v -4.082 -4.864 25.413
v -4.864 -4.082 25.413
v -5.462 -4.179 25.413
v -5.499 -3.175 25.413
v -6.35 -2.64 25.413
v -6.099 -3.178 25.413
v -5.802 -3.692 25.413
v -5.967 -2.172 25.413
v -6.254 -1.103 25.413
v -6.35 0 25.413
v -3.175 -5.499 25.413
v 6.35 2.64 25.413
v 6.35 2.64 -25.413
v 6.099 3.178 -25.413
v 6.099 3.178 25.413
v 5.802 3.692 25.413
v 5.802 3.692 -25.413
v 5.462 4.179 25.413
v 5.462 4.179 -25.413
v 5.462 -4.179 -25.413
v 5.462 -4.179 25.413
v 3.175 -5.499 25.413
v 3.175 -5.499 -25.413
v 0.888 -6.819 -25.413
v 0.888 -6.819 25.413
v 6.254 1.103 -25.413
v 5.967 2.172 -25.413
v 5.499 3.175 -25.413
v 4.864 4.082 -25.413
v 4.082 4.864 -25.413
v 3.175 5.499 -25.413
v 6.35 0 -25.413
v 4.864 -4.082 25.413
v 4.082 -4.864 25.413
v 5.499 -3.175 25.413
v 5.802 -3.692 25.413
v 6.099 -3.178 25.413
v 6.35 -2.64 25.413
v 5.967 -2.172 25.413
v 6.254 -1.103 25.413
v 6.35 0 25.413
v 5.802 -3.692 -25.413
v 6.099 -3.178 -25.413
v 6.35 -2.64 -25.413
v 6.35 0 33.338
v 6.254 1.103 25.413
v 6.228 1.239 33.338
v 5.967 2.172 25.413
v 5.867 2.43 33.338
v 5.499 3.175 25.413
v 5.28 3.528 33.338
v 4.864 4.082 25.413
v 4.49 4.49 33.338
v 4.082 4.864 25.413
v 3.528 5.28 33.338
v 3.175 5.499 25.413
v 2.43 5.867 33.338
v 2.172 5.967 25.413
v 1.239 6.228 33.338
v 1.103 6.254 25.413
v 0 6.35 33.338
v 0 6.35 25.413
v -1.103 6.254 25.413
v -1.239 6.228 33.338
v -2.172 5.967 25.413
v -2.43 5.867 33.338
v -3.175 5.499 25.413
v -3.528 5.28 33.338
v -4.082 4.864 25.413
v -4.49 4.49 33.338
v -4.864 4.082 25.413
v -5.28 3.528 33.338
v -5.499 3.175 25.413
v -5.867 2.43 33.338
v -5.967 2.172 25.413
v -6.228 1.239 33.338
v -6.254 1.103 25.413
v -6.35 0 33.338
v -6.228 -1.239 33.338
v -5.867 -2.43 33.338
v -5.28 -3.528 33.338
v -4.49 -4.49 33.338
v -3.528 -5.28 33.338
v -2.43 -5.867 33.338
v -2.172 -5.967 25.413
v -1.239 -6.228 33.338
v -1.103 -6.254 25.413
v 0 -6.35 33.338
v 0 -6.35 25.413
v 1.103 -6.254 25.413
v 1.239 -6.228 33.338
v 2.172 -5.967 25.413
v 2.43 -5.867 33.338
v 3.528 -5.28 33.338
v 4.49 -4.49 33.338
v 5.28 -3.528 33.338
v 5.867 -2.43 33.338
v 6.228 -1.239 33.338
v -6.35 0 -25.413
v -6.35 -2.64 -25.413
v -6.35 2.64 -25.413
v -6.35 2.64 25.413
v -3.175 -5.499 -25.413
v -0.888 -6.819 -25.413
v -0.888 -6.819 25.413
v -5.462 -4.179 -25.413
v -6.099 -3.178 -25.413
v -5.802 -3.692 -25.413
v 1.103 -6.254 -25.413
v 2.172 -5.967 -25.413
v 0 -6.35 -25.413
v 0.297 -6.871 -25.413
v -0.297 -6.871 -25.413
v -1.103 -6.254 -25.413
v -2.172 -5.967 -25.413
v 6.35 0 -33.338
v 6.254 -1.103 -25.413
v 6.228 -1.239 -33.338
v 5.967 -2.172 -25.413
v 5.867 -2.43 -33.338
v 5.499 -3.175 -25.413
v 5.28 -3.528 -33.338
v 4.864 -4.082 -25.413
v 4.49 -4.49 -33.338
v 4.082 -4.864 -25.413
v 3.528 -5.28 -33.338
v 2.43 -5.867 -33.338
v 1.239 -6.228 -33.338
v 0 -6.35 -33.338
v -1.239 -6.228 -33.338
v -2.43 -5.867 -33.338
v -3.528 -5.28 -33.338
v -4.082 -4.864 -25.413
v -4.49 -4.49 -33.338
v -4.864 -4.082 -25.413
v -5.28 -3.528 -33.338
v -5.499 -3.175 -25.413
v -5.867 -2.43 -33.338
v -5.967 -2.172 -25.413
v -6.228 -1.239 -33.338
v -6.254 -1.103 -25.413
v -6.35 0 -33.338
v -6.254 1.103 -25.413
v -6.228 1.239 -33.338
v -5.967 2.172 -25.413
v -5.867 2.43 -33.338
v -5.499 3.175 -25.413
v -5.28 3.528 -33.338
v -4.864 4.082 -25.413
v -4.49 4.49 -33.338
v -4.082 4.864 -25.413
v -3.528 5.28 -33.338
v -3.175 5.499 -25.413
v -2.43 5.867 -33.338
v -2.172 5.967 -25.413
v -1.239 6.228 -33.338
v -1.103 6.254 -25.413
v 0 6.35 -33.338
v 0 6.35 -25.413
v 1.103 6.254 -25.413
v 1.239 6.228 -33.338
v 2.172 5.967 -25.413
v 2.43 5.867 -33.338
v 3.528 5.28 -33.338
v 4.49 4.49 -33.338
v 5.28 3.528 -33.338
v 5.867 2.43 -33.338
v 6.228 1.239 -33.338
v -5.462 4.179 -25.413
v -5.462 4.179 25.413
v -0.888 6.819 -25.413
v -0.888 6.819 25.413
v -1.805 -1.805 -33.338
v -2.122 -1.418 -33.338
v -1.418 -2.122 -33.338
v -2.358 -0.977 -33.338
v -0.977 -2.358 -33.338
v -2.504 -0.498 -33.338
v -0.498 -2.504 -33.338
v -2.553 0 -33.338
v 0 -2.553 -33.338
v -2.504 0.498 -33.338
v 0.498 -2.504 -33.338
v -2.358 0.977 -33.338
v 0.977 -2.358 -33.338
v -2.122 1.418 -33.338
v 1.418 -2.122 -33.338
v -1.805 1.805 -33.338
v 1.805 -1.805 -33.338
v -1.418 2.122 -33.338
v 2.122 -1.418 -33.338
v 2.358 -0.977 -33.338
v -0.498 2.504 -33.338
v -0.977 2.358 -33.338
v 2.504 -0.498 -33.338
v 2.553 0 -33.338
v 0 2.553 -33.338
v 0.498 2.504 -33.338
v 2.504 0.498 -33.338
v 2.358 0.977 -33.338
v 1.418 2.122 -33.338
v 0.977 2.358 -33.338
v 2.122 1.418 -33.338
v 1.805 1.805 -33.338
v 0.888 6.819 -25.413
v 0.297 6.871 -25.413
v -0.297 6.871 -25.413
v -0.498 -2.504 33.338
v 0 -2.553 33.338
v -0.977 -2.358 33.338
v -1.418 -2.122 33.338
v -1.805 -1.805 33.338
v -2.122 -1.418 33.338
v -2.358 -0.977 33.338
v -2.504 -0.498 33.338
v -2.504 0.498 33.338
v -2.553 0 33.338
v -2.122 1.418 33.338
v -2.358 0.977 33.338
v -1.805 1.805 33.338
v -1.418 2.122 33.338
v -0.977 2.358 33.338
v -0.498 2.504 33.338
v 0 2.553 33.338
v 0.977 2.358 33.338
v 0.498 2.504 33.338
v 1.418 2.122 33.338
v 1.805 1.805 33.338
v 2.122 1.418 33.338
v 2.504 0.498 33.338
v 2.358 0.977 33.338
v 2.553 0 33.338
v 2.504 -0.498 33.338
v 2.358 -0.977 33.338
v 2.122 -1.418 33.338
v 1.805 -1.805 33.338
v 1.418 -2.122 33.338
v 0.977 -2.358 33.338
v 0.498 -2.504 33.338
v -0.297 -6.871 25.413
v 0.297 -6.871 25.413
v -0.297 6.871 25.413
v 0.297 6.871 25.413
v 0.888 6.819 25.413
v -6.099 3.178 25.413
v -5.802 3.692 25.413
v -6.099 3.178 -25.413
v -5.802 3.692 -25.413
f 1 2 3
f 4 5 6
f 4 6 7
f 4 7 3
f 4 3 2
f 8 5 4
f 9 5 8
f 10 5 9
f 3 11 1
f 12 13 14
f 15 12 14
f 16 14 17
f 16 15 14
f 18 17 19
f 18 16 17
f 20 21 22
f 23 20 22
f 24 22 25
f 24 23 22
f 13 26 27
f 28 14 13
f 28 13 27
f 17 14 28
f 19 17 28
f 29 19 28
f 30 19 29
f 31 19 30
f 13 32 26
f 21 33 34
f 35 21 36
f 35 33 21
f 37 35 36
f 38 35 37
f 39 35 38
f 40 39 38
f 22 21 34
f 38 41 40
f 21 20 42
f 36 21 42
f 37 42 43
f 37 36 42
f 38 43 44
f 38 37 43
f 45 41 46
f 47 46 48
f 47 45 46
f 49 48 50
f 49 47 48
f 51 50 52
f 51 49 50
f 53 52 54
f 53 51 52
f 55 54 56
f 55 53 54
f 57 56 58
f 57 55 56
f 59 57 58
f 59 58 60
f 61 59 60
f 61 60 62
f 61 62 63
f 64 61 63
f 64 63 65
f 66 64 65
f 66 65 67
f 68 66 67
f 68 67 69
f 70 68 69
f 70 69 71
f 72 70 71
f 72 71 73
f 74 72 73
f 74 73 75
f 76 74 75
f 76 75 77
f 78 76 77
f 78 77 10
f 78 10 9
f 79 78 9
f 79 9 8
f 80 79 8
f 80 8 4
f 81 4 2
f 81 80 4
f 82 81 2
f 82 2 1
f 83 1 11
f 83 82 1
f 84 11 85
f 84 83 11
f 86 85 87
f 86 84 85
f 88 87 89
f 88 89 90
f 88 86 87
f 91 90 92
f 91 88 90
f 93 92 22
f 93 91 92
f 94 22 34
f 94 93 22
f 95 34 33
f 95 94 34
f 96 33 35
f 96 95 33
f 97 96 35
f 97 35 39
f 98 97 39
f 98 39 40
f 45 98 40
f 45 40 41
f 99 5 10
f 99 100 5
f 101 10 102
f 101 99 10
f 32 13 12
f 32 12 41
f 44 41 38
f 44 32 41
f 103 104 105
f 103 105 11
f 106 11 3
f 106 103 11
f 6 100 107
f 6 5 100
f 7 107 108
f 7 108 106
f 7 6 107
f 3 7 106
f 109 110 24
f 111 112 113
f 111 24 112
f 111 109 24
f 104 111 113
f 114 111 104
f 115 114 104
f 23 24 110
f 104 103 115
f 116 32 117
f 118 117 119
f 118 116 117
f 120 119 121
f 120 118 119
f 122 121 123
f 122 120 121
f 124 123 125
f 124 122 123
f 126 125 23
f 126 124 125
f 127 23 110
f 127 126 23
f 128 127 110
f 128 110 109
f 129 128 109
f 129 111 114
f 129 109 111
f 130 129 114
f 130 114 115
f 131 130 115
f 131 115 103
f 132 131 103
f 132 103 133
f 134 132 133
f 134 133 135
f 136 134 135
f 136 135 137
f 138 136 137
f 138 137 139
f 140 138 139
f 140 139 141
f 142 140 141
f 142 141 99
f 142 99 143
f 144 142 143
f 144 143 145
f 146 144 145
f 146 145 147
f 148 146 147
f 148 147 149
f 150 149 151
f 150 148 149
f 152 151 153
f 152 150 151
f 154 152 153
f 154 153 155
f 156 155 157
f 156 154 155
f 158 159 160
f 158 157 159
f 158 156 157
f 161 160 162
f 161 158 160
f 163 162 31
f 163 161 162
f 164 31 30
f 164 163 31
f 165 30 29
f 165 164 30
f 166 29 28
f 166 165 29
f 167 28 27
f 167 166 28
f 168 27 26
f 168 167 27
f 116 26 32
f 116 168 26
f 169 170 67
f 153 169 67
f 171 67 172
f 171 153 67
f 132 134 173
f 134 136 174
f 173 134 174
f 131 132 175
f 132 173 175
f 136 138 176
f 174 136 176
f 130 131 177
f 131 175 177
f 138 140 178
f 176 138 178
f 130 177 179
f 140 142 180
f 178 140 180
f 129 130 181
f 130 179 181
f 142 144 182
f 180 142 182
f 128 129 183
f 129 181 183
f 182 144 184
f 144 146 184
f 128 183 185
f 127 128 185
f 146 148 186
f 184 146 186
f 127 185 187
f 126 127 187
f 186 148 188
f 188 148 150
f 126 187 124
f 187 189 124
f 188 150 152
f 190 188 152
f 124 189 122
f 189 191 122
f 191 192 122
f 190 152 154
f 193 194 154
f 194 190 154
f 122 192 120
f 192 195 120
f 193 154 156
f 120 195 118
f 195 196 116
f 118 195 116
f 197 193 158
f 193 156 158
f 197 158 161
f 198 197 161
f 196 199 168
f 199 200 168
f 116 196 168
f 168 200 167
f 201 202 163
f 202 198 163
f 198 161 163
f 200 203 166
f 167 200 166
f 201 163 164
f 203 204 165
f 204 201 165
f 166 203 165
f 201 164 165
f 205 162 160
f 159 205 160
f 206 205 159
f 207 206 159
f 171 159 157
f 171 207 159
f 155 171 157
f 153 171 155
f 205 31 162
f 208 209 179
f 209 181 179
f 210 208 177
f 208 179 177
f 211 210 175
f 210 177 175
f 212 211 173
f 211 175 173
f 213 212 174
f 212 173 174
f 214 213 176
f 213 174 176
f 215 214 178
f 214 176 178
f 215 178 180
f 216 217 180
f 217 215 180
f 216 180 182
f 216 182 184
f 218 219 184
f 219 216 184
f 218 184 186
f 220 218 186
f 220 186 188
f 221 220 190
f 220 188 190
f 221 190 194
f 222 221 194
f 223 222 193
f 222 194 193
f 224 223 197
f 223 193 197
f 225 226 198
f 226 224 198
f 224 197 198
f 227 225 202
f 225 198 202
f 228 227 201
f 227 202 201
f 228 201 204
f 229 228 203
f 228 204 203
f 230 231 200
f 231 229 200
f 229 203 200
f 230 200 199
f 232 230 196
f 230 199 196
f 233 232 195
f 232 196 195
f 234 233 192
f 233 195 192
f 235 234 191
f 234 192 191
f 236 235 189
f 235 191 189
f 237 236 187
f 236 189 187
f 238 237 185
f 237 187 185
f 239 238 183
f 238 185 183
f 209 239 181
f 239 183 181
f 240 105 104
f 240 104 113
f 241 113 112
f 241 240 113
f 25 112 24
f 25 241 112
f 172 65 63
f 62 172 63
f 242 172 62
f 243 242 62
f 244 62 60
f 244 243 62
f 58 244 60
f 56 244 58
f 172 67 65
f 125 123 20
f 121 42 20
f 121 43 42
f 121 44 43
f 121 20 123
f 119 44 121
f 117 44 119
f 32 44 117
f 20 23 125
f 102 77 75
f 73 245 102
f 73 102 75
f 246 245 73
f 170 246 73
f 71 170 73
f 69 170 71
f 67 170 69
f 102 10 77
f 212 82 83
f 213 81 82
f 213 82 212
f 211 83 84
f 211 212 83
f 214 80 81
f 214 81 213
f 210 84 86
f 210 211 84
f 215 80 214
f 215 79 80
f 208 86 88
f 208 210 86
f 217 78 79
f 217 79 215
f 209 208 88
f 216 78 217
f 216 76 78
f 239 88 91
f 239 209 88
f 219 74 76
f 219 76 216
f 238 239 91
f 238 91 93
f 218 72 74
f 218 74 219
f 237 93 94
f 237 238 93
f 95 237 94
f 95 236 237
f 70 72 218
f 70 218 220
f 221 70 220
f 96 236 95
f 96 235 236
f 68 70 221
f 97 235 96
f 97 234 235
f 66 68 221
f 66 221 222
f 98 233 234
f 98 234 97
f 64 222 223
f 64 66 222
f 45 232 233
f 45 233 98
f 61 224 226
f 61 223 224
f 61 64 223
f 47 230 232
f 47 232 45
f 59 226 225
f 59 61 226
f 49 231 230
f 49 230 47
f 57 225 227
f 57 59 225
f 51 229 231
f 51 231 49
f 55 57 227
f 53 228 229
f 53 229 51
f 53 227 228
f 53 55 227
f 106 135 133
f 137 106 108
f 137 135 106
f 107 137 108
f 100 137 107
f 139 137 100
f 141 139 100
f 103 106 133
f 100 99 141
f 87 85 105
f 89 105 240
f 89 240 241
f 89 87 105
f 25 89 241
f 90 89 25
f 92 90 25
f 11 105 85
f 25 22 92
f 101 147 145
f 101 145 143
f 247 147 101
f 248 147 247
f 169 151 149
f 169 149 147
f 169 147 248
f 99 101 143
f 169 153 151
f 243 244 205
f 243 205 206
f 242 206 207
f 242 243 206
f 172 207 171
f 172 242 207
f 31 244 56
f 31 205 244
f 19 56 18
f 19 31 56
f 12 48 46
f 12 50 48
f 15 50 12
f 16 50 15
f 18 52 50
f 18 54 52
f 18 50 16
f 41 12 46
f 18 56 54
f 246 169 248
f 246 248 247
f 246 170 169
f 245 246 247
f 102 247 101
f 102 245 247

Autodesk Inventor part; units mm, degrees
ref_plane "YZ Plane" through (0, 0, 0) normal (1, 0, 0) x (0, 1, 0)
ref_plane "XZ Plane" through (0, 0, 0) normal (0, 1, 0) x (-1, 0, 0)
ref_plane "XY Plane" through (0, 0, 0) normal (0, 0, 1) x (1, 0, 0)
sketch "Sketch1" plane through (0, 0, 0) normal (0, 0, 1) x (1, 0, 0)
  line L0 (-6.35, -3.6662) -> (-6.35, 3.6662)
  line L1 (-6.35, 3.6662) -> (0, 7.3323)
  line L2 (0, 7.3323) -> (6.35, 3.6662)
  line L3 (6.35, 3.6662) -> (6.35, -3.6662)
  line L4 (6.35, -3.6662) -> (0, -7.3323)
  line L5 (0, -7.3323) -> (-6.35, -3.6662)
  point P0 (0, 0)
  point P1 (0, 0)
  dimension "Size" = 12.7
extrude "Extrusion1" add sketch "Sketch1" along normal mid plane 66.675
sketch "Sketch3" plane through (0, 0, 33.3375) normal (0, 0, 1) x (1, 0, 0)
  line L0 (-6.35, 3.6662) -> (0, 7.3323) construction
  line L1 (0, 7.3323) -> (6.35, 3.6662) construction
  line L2 (6.35, 3.6662) -> (6.35, -3.6662) construction
  line L3 (6.35, -3.6662) -> (0, -7.3323) construction
  line L4 (0, -7.3323) -> (-6.35, -3.6662) construction
  line L5 (-6.35, -3.6662) -> (-6.35, 3.6662) construction
  point P0 (0, 0)
hole "Hole1" at (0, 0, 33.3375) direction (0, 0, -1) diameter 5.1054 end through all
sketch "Sketch4" plane through (0, 0, 33.3375) normal (0, 0, 1) x (1, 0, 0)
  circle A0 centre (0, 0) radius 2.5527 construction
  line L0 (-6.35, 3.6662) -> (0, 7.3323) construction
  line L1 (0, 7.3323) -> (6.35, 3.6662) construction
  line L2 (6.35, 3.6662) -> (6.35, -3.6662) construction
  line L3 (6.35, -3.6662) -> (0, -7.3323) construction
  line L4 (0, -7.3323) -> (-6.35, -3.6662) construction
  line L5 (-6.35, -3.6662) -> (-6.35, 3.6662) construction
  circle A1 centre (0, 0) radius 6.8771
  circle A2 centre (0, 0) radius 8.89
  dimension "thunder" = 13.7541
  dimension "d16" = 17.78
extrude "Extrusion3" cut sketch "Sketch4" against normal through all
sketch "Sketch5" plane through (0, 0, 33.3375) normal (0, 0, 1) x (1, 0, 0)
  circle A0 centre (0, 0) radius 2.5527 projected
  circle A1 centre (0, 0) radius 6.35
  arc A2 (5.4616, -4.1791) -> (6.35, -2.6403) centre (0, 0) ccw projected
  line L0 (6.35, -2.6403) -> (6.35, 2.6403) projected
  arc A3 (6.35, 2.6403) -> (5.4616, 4.1791) centre (0, 0) ccw projected
  line L1 (5.4616, 4.1791) -> (0.8884, 6.8194) projected
  arc A4 (0.8884, 6.8194) -> (-0.8884, 6.8194) centre (0, 0) ccw projected
  line L2 (-0.8884, 6.8194) -> (-5.4616, 4.1791) projected
  arc A5 (-5.4616, 4.1791) -> (-6.35, 2.6403) centre (0, 0) ccw projected
  line L3 (-6.35, 2.6403) -> (-6.35, -2.6403) projected
  arc A6 (-6.35, -2.6403) -> (-5.4616, -4.1791) centre (0, 0) ccw projected
  line L4 (-5.4616, -4.1791) -> (-0.8884, -6.8194) projected
  arc A7 (-0.8884, -6.8194) -> (0.8884, -6.8194) centre (0, 0) ccw projected
  line L5 (0.8884, -6.8194) -> (5.4616, -4.1791) projected
  circle A8 centre (0, 0) radius 2.5527 projected
  point P0 (3.175, -5.4993)
  point P1 (-3.175, -5.4993)
  point P2 (-6.35, 0)
  point P3 (-3.175, 5.4993)
  point P4 (3.175, 5.4993)
  point P5 (6.35, 0)
  dimension "d21" = 12.7
extrude "Extrusion4" cut sketch "Sketch5" against normal blind 7.9248 contours A0 | L0 A2 L5 A1 | A1 L1 A3 L0 | A1 L2 A4 L1 | L5 A7 L4 A1 | A1 L3 A5 L2 | L4 A6 L3 A1
mirror "Mirror2" about plane through (0, 0, 0) normal (0, 0, 1) of "Extrusion4"
equation "\"bearing\" = 25.4"
properties part number "GP10-011" material "Aluminum 6061"
